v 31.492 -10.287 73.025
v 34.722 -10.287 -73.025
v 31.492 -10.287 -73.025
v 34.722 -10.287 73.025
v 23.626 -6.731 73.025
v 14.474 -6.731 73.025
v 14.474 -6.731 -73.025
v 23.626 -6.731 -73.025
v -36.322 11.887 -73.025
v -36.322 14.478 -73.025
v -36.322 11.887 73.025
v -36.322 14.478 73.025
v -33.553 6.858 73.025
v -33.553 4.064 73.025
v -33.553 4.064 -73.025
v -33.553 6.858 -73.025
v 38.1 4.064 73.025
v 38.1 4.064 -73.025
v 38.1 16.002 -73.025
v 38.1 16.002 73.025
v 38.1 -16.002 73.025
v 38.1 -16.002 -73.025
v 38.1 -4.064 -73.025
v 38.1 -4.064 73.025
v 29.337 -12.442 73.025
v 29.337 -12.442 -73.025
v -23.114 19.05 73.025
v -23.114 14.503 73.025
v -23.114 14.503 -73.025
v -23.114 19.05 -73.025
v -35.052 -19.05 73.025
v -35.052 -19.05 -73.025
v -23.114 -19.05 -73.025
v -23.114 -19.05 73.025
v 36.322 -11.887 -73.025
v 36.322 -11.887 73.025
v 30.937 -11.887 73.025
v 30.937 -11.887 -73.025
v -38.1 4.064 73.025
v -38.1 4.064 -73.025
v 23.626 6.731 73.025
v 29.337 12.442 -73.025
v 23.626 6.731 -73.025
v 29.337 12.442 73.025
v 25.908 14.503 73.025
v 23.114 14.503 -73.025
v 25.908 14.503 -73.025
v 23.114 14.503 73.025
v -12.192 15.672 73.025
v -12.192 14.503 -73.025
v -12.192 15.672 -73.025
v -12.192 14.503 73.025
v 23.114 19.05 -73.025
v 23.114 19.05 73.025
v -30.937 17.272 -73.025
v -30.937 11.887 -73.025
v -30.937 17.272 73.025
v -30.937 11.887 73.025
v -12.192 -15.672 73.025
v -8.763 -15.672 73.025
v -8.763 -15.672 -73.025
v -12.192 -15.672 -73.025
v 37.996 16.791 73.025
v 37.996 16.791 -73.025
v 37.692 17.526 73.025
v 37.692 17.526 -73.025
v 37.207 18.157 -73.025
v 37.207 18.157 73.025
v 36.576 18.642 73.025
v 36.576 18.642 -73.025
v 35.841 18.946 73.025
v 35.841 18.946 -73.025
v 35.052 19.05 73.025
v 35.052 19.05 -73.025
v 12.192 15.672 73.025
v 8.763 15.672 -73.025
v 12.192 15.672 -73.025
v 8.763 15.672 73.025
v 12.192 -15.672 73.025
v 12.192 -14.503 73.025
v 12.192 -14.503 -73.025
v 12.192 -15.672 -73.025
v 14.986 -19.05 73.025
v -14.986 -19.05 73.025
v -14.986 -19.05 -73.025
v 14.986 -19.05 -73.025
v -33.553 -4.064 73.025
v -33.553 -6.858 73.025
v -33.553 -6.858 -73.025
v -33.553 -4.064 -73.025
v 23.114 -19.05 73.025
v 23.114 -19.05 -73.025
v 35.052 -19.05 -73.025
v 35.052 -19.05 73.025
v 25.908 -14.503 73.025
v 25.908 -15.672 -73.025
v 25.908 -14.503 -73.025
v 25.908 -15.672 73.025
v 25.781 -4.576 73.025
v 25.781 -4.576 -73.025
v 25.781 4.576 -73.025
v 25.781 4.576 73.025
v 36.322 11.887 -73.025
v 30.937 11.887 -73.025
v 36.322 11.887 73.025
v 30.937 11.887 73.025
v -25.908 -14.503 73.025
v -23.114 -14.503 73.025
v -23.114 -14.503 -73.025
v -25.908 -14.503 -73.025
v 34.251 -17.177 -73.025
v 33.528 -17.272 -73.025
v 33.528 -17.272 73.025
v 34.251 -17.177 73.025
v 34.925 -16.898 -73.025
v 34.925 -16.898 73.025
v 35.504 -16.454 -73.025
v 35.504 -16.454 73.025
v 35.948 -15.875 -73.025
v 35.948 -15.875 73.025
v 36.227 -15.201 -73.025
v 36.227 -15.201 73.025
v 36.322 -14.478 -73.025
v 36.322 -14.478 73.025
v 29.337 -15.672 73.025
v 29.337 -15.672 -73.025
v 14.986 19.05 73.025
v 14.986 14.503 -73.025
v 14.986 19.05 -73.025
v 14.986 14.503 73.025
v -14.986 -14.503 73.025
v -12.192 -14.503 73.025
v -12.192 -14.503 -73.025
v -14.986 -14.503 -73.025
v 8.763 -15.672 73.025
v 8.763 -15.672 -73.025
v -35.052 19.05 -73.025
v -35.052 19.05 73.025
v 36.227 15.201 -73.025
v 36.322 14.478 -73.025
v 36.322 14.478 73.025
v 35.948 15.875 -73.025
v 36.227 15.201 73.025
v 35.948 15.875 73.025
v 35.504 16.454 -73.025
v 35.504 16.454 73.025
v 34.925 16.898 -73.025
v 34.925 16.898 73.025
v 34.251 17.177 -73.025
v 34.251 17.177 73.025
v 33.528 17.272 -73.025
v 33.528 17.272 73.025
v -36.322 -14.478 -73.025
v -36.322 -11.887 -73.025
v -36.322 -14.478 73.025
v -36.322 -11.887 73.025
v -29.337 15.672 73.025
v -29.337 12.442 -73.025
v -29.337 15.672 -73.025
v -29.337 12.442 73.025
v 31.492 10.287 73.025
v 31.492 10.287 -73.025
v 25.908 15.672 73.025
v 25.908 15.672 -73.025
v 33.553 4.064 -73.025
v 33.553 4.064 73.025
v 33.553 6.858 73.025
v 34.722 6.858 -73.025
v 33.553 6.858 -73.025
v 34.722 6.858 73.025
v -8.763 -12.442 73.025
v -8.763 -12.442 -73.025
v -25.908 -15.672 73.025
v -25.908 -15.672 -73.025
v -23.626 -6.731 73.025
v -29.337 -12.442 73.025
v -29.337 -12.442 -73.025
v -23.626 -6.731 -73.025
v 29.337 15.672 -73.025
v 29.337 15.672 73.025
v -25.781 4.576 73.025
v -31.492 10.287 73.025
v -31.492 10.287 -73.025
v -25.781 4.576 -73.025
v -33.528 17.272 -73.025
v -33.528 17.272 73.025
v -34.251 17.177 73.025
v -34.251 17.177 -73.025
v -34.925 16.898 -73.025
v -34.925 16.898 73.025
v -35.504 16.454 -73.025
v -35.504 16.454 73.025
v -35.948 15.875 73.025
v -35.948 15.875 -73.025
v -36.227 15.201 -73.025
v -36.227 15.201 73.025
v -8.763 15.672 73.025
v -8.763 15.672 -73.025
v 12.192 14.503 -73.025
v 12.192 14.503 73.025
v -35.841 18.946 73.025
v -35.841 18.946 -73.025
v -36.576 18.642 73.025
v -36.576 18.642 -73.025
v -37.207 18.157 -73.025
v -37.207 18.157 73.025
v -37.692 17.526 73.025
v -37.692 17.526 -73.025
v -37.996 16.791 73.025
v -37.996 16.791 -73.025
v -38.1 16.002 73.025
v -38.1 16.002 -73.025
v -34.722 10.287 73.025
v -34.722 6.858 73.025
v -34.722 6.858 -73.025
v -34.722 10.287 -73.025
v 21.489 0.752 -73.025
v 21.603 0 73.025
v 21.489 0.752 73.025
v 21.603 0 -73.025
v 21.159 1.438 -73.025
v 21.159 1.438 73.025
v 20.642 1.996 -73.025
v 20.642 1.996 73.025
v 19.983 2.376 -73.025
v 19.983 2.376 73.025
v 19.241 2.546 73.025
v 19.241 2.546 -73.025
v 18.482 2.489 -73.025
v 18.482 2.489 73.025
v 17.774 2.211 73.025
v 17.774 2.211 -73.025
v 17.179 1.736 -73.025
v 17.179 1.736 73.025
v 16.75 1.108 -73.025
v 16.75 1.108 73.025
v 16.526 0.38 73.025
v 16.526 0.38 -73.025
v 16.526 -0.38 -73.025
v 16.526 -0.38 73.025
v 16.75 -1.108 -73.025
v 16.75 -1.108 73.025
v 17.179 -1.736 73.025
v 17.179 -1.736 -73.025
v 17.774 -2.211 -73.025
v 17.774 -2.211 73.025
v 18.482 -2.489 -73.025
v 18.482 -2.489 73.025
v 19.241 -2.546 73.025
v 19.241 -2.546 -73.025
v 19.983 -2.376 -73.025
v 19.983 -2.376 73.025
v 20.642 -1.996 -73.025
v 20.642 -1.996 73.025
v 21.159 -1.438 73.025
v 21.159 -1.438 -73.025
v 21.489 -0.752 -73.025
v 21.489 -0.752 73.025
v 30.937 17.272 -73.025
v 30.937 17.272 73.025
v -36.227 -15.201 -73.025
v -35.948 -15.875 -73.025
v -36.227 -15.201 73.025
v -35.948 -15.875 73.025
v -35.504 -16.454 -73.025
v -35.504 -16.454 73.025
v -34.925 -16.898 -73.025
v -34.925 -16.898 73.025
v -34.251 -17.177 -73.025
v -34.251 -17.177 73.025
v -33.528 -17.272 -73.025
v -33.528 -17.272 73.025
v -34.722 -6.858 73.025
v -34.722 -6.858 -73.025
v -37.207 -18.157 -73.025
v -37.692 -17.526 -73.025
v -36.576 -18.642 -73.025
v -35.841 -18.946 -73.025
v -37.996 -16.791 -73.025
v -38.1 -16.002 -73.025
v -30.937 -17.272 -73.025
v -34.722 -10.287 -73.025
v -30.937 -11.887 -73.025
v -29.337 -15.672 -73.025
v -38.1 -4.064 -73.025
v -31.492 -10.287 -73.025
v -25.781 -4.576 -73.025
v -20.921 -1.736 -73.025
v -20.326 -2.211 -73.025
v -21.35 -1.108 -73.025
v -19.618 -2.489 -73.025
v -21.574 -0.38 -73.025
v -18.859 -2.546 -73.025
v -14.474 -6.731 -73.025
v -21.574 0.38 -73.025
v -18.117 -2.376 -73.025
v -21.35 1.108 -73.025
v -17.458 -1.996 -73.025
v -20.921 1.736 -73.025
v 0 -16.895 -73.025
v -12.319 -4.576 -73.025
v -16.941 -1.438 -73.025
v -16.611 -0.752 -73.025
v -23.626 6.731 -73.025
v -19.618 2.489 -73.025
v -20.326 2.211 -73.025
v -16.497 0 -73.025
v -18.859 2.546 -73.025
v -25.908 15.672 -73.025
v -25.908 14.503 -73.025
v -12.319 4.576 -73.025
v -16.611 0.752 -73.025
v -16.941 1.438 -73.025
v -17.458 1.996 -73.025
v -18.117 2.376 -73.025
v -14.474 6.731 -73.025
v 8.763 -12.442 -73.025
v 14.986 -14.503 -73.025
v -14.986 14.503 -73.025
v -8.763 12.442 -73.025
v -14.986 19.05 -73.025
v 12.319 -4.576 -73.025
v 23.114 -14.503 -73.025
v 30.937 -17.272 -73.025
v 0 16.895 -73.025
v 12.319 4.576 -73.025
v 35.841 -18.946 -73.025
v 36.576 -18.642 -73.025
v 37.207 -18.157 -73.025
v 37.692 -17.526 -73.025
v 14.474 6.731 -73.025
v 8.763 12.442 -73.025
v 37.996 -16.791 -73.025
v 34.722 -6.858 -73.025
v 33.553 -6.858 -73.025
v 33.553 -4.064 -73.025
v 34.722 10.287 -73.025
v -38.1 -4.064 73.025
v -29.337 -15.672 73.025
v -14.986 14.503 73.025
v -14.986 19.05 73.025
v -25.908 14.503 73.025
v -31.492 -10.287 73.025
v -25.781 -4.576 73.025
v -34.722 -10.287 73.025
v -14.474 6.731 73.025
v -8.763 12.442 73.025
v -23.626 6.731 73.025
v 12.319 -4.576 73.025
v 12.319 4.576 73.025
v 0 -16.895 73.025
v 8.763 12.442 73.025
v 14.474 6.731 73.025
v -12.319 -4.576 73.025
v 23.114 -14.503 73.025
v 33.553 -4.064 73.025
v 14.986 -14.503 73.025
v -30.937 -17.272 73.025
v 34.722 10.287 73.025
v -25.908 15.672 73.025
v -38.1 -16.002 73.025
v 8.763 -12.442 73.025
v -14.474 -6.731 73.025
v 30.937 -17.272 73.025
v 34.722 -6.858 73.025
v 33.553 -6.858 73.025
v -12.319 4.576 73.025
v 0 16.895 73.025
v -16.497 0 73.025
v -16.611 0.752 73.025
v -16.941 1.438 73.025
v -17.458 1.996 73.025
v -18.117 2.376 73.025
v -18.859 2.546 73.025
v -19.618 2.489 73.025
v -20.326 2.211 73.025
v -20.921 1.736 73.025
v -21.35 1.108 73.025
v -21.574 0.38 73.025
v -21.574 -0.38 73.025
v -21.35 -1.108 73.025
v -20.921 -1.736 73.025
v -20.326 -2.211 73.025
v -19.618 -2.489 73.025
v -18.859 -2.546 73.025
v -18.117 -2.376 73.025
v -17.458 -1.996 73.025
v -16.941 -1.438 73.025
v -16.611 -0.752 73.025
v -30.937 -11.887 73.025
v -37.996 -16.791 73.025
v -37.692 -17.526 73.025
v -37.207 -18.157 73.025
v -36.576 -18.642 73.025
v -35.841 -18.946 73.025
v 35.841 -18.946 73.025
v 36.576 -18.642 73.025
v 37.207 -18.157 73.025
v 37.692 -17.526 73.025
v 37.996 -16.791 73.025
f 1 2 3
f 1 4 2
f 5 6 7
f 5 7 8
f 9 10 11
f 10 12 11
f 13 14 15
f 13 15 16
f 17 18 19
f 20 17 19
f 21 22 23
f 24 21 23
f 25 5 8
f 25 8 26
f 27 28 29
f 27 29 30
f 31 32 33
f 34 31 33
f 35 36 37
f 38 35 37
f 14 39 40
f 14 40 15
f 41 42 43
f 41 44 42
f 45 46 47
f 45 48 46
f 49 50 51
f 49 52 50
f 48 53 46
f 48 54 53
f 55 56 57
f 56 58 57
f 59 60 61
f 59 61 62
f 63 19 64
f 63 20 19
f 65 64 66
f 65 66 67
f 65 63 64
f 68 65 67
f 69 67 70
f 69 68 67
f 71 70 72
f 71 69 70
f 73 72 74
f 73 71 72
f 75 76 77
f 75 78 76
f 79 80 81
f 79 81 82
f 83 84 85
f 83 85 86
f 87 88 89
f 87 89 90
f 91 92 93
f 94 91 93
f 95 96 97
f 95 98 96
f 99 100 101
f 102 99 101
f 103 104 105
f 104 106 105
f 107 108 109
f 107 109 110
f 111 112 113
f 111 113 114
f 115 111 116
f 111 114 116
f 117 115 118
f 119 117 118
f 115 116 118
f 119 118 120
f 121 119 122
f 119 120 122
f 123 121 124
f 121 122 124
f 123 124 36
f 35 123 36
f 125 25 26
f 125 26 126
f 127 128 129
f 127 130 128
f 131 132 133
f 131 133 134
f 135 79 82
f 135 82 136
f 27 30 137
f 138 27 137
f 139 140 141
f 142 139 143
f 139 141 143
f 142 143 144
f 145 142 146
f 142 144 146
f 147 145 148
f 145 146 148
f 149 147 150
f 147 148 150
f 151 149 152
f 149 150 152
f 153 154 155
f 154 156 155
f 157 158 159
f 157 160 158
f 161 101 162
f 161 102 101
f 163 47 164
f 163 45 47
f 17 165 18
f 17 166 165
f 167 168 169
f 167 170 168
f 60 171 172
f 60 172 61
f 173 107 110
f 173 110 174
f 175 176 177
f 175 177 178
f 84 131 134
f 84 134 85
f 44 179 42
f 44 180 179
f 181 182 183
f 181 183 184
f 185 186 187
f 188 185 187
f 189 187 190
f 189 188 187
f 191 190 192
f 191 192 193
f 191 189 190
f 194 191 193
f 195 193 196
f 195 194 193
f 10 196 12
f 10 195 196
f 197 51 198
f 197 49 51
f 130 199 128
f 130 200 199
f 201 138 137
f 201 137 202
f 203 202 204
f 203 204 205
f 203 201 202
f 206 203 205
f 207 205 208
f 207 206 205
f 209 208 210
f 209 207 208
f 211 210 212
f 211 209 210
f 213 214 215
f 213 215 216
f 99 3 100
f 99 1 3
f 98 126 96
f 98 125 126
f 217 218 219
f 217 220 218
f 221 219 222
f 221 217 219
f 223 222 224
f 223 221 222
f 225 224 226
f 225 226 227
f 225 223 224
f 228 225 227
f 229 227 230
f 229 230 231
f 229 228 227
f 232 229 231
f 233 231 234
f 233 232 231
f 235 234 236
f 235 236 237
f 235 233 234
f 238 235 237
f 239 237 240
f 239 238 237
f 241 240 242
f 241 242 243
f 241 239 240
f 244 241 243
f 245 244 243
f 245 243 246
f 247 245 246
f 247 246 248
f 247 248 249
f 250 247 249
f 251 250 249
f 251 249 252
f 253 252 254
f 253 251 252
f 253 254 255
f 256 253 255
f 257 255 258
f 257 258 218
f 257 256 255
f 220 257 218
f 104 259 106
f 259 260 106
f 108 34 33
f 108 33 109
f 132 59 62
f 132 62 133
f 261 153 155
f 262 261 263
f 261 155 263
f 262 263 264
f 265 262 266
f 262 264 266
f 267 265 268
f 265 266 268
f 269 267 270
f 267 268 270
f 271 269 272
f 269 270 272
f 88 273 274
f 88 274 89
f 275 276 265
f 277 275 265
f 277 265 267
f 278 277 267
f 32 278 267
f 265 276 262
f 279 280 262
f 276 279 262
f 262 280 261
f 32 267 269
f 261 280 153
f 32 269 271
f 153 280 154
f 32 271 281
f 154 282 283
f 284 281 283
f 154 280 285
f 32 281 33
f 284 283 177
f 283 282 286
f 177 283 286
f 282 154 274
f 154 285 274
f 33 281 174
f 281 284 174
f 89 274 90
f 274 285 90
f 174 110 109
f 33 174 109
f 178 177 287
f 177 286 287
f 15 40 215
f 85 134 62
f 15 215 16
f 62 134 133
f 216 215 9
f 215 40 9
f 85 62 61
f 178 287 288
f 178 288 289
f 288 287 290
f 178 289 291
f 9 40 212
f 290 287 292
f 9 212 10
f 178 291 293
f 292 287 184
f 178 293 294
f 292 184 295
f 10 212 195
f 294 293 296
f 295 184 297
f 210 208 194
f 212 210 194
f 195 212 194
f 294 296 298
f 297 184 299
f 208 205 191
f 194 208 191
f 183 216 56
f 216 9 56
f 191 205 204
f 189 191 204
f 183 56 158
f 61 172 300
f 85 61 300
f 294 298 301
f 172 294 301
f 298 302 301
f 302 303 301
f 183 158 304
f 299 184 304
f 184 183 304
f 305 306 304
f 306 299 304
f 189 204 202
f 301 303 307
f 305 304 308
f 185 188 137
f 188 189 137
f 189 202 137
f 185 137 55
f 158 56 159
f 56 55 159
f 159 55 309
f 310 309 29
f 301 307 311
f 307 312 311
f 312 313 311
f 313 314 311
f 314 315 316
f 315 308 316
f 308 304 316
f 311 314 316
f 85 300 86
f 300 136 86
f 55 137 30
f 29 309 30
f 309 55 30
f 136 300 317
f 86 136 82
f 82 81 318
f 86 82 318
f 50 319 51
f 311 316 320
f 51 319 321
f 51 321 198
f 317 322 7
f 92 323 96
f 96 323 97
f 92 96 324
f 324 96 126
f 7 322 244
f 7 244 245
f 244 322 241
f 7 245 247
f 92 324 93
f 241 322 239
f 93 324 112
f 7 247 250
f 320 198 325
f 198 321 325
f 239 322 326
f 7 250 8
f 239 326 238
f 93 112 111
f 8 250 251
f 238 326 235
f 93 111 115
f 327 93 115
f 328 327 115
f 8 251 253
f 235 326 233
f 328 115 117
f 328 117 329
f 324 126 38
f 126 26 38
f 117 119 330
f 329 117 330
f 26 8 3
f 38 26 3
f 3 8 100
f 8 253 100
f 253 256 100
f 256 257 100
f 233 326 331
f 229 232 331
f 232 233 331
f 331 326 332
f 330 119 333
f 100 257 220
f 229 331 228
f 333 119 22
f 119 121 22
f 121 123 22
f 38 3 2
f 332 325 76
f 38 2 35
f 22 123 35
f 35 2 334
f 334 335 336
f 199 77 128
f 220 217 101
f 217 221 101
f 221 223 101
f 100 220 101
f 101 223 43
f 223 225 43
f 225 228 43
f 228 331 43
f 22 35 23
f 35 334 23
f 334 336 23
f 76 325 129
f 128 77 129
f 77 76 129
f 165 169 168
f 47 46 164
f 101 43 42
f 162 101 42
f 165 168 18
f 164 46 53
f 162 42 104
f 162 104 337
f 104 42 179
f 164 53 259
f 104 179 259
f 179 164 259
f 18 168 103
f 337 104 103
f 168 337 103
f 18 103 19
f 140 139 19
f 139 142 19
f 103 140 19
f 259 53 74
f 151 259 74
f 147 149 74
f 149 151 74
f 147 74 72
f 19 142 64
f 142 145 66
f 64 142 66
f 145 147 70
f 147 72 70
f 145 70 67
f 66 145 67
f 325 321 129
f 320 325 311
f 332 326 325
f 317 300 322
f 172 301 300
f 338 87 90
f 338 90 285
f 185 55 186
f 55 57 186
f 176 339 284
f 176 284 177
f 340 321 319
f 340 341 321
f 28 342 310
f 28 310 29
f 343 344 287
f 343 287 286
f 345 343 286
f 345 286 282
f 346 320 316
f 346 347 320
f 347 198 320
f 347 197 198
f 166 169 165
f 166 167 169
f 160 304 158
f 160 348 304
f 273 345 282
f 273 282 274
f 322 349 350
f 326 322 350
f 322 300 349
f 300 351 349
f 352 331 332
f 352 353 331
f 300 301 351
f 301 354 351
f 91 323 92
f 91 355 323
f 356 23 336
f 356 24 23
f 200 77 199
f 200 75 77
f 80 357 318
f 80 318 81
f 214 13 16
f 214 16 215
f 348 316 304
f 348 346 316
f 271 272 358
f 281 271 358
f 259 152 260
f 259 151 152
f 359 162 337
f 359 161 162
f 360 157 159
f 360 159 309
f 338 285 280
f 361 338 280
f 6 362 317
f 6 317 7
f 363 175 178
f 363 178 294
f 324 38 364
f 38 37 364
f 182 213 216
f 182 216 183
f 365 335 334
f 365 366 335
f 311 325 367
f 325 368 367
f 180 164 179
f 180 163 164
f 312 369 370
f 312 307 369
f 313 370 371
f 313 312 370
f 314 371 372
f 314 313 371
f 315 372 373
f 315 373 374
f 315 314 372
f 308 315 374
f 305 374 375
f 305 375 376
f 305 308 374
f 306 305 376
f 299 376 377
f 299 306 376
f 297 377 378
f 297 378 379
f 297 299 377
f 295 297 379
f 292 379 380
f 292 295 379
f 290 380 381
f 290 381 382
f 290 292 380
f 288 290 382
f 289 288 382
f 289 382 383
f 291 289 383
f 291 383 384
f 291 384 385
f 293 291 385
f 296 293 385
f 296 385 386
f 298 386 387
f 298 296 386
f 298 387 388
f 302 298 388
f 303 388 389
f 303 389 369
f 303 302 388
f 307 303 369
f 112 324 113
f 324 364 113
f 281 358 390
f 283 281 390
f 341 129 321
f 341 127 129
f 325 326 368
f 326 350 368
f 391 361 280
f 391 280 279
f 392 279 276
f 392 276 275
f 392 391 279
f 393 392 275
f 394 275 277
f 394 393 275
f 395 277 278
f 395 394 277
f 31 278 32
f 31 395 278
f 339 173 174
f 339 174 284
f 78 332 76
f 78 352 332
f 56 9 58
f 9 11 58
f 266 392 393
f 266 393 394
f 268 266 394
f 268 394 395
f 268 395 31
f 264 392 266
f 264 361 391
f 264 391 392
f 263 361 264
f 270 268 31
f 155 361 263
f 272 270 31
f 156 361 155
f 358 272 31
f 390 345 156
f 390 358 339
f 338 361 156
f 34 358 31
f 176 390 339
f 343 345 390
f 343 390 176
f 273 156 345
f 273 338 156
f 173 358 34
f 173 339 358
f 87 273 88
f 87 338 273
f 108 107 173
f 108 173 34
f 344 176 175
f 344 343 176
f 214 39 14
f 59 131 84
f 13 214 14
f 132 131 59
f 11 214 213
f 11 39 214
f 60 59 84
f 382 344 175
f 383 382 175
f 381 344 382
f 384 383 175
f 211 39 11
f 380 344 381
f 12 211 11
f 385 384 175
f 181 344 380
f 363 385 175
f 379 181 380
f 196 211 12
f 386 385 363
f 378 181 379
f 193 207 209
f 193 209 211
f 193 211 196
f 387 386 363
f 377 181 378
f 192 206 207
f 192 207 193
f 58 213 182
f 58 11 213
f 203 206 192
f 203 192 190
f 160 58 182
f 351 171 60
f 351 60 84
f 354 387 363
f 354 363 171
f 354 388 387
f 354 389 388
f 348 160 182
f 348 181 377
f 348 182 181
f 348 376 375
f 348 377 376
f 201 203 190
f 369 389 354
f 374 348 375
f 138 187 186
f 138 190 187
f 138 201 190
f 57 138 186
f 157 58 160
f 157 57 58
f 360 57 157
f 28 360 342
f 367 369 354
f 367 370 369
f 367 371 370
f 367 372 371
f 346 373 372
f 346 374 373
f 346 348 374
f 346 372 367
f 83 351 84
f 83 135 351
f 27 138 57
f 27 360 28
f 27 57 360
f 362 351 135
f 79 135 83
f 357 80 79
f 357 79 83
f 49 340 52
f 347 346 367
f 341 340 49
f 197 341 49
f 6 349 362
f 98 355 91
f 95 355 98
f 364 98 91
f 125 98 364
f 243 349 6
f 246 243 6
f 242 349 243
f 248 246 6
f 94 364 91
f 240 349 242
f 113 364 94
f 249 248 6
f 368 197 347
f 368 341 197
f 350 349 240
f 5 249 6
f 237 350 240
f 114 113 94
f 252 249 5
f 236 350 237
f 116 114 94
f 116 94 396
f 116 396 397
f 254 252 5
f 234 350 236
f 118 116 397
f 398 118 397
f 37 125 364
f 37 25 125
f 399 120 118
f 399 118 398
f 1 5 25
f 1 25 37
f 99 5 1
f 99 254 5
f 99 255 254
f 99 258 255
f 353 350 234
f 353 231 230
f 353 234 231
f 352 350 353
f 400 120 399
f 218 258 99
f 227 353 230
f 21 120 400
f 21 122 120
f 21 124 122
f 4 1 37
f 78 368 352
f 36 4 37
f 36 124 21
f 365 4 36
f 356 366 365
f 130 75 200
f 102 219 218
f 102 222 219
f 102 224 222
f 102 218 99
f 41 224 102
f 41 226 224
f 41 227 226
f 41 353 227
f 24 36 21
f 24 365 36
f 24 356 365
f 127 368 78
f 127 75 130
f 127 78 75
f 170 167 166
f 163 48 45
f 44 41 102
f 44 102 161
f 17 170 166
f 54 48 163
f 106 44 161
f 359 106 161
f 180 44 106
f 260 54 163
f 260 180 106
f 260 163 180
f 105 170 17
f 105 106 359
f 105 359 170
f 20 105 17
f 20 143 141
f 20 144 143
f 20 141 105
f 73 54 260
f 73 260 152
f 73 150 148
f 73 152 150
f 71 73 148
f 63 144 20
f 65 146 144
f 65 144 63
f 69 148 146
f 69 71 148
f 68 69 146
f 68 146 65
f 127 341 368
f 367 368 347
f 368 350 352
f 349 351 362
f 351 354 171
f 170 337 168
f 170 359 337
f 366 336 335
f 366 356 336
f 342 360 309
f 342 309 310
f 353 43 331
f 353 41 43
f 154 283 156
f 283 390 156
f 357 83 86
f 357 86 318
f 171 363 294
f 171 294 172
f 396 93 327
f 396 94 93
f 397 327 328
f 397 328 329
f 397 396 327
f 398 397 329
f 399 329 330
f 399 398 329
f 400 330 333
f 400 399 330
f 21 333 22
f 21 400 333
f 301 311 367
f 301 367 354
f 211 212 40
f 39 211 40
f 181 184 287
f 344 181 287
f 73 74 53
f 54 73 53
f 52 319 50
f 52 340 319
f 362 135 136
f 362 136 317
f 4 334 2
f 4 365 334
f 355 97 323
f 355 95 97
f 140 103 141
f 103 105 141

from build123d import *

# Parameters (mm, degrees)
SKETCH1_R           = 2.5527
BOSS_EXTRUDE1_DEPTH = 73.025


with BuildPart() as part:
    # Sketch1 → Boss-Extrude1 (new, symmetric)
    with BuildSketch(Plane.XY):
        with BuildLine():
            Line((-29.337, 12.442261469), (-29.337, 15.6718))
            Line((-29.337, 15.6718), (-25.908, 15.6718))
            Line((-25.908, 15.6718), (-25.908, 14.5034))
            Line((-25.908, 14.5034), (-23.114, 14.5034))
            Line((-23.114, 14.5034), (-23.114, 19.05))
            Line((-23.114, 19.05), (-35.052, 19.05))
            ThreePointArc((-35.052, 19.05), (-37.207261469, 18.157261469), (-38.1, 16.002))
            Line((-38.1, 16.002), (-38.1, 4.064))
            Line((-38.1, 4.064), (-33.5534, 4.064))
            Line((-33.5534, 4.064), (-33.5534, 6.858))
            Line((-33.5534, 6.858), (-34.7218, 6.858))
            Line((-34.7218, 6.858), (-34.7218, 10.287))
            Line((-34.7218, 10.287), (-31.492261469, 10.287))
            Line((-31.492261469, 10.287), (-25.781, 4.575738531))
            Line((-25.781, 4.575738531), (-25.781, -4.575738531))
            Line((-25.781, -4.575738531), (-31.492261469, -10.287))
            Line((-31.492261469, -10.287), (-34.7218, -10.287))
            Line((-34.7218, -10.287), (-34.7218, -6.858))
            Line((-34.7218, -6.858), (-33.5534, -6.858))
            Line((-33.5534, -6.858), (-33.5534, -4.064))
            Line((-33.5534, -4.064), (-38.1, -4.064))
            Line((-38.1, -4.064), (-38.1, -16.002))
            ThreePointArc((-38.1, -16.002), (-37.207261469, -18.157261469), (-35.052, -19.05))
            Line((-35.052, -19.05), (-23.114, -19.05))
            Line((-23.114, -19.05), (-23.114, -14.5034))
            Line((-23.114, -14.5034), (-25.908, -14.5034))
            Line((-25.908, -14.5034), (-25.908, -15.6718))
            Line((-25.908, -15.6718), (-29.337, -15.6718))
            Line((-29.337, -15.6718), (-29.337, -12.442261469))
            Line((-29.337, -12.442261469), (-23.625738531, -6.731))
            Line((-23.625738531, -6.731), (-14.474261469, -6.731))
            Line((-14.474261469, -6.731), (-8.763, -12.442261469))
            Line((-8.763, -12.442261469), (-8.763, -15.6718))
            Line((-8.763, -15.6718), (-12.192, -15.6718))
            Line((-12.192, -15.6718), (-12.192, -14.5034))
            Line((-12.192, -14.5034), (-14.986, -14.5034))
            Line((-14.986, -14.5034), (-14.986, -19.05))
            Line((-14.986, -19.05), (14.986, -19.05))
            Line((14.986, -19.05), (14.986, -14.5034))
            Line((14.986, -14.5034), (12.192, -14.5034))
            Line((12.192, -14.5034), (12.192, -15.6718))
            Line((12.192, -15.6718), (8.763, -15.6718))
            Line((8.763, -15.6718), (8.763, -12.442261469))
            Line((8.763, -12.442261469), (14.474261469, -6.731))
            Line((14.474261469, -6.731), (23.625738531, -6.731))
            Line((23.625738531, -6.731), (29.337, -12.442261469))
            Line((29.337, -12.442261469), (29.337, -15.6718))
            Line((29.337, -15.6718), (25.908, -15.6718))
            Line((25.908, -15.6718), (25.908, -14.5034))
            Line((25.908, -14.5034), (23.114, -14.5034))
            Line((23.114, -14.5034), (23.114, -19.05))
            Line((23.114, -19.05), (35.052, -19.05))
            ThreePointArc((35.052, -19.05), (37.207261469, -18.157261469), (38.1, -16.002))
            Line((38.1, -16.002), (38.1, -4.064))
            Line((38.1, -4.064), (33.5534, -4.064))
            Line((33.5534, -4.064), (33.5534, -6.858))
            Line((33.5534, -6.858), (34.7218, -6.858))
            Line((34.7218, -6.858), (34.7218, -10.287))
            Line((34.7218, -10.287), (31.492261469, -10.287))
            Line((31.492261469, -10.287), (25.781, -4.575738531))
            Line((25.781, -4.575738531), (25.781, 4.575738531))
            Line((25.781, 4.575738531), (31.492261469, 10.287))
            Line((31.492261469, 10.287), (34.7218, 10.287))
            Line((34.7218, 10.287), (34.7218, 6.858))
            Line((34.7218, 6.858), (33.5534, 6.858))
            Line((33.5534, 6.858), (33.5534, 4.064))
            Line((33.5534, 4.064), (38.1, 4.064))
            Line((38.1, 4.064), (38.1, 16.002))
            ThreePointArc((38.1, 16.002), (37.207261469, 18.157261469), (35.052, 19.05))
            Line((35.052, 19.05), (23.114, 19.05))
            Line((23.114, 19.05), (23.114, 14.5034))
            Line((23.114, 14.5034), (25.908, 14.5034))
            Line((25.908, 14.5034), (25.908, 15.6718))
            Line((25.908, 15.6718), (29.337, 15.6718))
            Line((29.337, 15.6718), (29.337, 12.442261469))
            Line((29.337, 12.442261469), (23.625738531, 6.731))
            Line((23.625738531, 6.731), (14.474261469, 6.731))
            Line((14.474261469, 6.731), (8.763, 12.442261469))
            Line((8.763, 12.442261469), (8.763, 15.6718))
            Line((8.763, 15.6718), (12.192, 15.6718))
            Line((12.192, 15.6718), (12.192, 14.5034))
            Line((12.192, 14.5034), (14.986, 14.5034))
            Line((14.986, 14.5034), (14.986, 19.05))
            Line((14.986, 19.05), (-14.986, 19.05))
            Line((-14.986, 19.05), (-14.986, 14.5034))
            Line((-14.986, 14.5034), (-12.192, 14.5034))
            Line((-12.192, 14.5034), (-12.192, 15.6718))
            Line((-12.192, 15.6718), (-8.763, 15.6718))
            Line((-8.763, 15.6718), (-8.763, 12.442261469))
            Line((-8.763, 12.442261469), (-14.474261469, 6.731))
            Line((-14.474261469, 6.731), (-23.625738531, 6.731))
            Line((-23.625738531, 6.731), (-29.337, 12.442261469))
        make_face()
        with Locations((-19.05, 0)):
            Circle(SKETCH1_R, mode=Mode.SUBTRACT)
        with Locations((19.05, 0)):
            Circle(SKETCH1_R, mode=Mode.SUBTRACT)
        Polygon((-12.319, 4.575738531), (-12.319, -4.575738531), (0, -16.894738531), (12.319, -4.575738531), (12.319, 4.575738531), (0, 16.894738531), align=None, mode=Mode.SUBTRACT)
        with BuildLine():
            Line((-30.9372, 11.8872), (-30.9372, 17.272))
            Line((-30.9372, 17.272), (-33.528, 17.272))
            ThreePointArc((-33.528, 17.272), (-35.503656347, 16.453656347), (-36.322, 14.478))
            Line((-36.322, 14.478), (-36.322, 11.8872))
            Line((-36.322, 11.8872), (-30.9372, 11.8872))
        make_face(mode=Mode.SUBTRACT)
        with BuildLine():
            Line((-30.9372, -17.272), (-30.9372, -11.8872))
            Line((-30.9372, -11.8872), (-36.322, -11.8872))
            Line((-36.322, -11.8872), (-36.322, -14.478))
            ThreePointArc((-36.322, -14.478), (-35.503656347, -16.453656347), (-33.528, -17.272))
            Line((-33.528, -17.272), (-30.9372, -17.272))
        make_face(mode=Mode.SUBTRACT)
        with BuildLine():
            Line((36.322, -11.8872), (30.9372, -11.8872))
            Line((30.9372, -11.8872), (30.9372, -17.272))
            Line((30.9372, -17.272), (33.528, -17.272))
            ThreePointArc((33.528, -17.272), (35.503656347, -16.453656347), (36.322, -14.478))
            Line((36.322, -14.478), (36.322, -11.8872))
        make_face(mode=Mode.SUBTRACT)
        with BuildLine():
            Line((30.9372, 17.272), (30.9372, 11.8872))
            Line((30.9372, 11.8872), (36.322, 11.8872))
            Line((36.322, 11.8872), (36.322, 14.478))
            ThreePointArc((36.322, 14.478), (35.503656347, 16.453656347), (33.528, 17.272))
            Line((33.528, 17.272), (30.9372, 17.272))
        make_face(mode=Mode.SUBTRACT)
    extrude(amount=BOSS_EXTRUDE1_DEPTH, both=True)


solid = part.part
